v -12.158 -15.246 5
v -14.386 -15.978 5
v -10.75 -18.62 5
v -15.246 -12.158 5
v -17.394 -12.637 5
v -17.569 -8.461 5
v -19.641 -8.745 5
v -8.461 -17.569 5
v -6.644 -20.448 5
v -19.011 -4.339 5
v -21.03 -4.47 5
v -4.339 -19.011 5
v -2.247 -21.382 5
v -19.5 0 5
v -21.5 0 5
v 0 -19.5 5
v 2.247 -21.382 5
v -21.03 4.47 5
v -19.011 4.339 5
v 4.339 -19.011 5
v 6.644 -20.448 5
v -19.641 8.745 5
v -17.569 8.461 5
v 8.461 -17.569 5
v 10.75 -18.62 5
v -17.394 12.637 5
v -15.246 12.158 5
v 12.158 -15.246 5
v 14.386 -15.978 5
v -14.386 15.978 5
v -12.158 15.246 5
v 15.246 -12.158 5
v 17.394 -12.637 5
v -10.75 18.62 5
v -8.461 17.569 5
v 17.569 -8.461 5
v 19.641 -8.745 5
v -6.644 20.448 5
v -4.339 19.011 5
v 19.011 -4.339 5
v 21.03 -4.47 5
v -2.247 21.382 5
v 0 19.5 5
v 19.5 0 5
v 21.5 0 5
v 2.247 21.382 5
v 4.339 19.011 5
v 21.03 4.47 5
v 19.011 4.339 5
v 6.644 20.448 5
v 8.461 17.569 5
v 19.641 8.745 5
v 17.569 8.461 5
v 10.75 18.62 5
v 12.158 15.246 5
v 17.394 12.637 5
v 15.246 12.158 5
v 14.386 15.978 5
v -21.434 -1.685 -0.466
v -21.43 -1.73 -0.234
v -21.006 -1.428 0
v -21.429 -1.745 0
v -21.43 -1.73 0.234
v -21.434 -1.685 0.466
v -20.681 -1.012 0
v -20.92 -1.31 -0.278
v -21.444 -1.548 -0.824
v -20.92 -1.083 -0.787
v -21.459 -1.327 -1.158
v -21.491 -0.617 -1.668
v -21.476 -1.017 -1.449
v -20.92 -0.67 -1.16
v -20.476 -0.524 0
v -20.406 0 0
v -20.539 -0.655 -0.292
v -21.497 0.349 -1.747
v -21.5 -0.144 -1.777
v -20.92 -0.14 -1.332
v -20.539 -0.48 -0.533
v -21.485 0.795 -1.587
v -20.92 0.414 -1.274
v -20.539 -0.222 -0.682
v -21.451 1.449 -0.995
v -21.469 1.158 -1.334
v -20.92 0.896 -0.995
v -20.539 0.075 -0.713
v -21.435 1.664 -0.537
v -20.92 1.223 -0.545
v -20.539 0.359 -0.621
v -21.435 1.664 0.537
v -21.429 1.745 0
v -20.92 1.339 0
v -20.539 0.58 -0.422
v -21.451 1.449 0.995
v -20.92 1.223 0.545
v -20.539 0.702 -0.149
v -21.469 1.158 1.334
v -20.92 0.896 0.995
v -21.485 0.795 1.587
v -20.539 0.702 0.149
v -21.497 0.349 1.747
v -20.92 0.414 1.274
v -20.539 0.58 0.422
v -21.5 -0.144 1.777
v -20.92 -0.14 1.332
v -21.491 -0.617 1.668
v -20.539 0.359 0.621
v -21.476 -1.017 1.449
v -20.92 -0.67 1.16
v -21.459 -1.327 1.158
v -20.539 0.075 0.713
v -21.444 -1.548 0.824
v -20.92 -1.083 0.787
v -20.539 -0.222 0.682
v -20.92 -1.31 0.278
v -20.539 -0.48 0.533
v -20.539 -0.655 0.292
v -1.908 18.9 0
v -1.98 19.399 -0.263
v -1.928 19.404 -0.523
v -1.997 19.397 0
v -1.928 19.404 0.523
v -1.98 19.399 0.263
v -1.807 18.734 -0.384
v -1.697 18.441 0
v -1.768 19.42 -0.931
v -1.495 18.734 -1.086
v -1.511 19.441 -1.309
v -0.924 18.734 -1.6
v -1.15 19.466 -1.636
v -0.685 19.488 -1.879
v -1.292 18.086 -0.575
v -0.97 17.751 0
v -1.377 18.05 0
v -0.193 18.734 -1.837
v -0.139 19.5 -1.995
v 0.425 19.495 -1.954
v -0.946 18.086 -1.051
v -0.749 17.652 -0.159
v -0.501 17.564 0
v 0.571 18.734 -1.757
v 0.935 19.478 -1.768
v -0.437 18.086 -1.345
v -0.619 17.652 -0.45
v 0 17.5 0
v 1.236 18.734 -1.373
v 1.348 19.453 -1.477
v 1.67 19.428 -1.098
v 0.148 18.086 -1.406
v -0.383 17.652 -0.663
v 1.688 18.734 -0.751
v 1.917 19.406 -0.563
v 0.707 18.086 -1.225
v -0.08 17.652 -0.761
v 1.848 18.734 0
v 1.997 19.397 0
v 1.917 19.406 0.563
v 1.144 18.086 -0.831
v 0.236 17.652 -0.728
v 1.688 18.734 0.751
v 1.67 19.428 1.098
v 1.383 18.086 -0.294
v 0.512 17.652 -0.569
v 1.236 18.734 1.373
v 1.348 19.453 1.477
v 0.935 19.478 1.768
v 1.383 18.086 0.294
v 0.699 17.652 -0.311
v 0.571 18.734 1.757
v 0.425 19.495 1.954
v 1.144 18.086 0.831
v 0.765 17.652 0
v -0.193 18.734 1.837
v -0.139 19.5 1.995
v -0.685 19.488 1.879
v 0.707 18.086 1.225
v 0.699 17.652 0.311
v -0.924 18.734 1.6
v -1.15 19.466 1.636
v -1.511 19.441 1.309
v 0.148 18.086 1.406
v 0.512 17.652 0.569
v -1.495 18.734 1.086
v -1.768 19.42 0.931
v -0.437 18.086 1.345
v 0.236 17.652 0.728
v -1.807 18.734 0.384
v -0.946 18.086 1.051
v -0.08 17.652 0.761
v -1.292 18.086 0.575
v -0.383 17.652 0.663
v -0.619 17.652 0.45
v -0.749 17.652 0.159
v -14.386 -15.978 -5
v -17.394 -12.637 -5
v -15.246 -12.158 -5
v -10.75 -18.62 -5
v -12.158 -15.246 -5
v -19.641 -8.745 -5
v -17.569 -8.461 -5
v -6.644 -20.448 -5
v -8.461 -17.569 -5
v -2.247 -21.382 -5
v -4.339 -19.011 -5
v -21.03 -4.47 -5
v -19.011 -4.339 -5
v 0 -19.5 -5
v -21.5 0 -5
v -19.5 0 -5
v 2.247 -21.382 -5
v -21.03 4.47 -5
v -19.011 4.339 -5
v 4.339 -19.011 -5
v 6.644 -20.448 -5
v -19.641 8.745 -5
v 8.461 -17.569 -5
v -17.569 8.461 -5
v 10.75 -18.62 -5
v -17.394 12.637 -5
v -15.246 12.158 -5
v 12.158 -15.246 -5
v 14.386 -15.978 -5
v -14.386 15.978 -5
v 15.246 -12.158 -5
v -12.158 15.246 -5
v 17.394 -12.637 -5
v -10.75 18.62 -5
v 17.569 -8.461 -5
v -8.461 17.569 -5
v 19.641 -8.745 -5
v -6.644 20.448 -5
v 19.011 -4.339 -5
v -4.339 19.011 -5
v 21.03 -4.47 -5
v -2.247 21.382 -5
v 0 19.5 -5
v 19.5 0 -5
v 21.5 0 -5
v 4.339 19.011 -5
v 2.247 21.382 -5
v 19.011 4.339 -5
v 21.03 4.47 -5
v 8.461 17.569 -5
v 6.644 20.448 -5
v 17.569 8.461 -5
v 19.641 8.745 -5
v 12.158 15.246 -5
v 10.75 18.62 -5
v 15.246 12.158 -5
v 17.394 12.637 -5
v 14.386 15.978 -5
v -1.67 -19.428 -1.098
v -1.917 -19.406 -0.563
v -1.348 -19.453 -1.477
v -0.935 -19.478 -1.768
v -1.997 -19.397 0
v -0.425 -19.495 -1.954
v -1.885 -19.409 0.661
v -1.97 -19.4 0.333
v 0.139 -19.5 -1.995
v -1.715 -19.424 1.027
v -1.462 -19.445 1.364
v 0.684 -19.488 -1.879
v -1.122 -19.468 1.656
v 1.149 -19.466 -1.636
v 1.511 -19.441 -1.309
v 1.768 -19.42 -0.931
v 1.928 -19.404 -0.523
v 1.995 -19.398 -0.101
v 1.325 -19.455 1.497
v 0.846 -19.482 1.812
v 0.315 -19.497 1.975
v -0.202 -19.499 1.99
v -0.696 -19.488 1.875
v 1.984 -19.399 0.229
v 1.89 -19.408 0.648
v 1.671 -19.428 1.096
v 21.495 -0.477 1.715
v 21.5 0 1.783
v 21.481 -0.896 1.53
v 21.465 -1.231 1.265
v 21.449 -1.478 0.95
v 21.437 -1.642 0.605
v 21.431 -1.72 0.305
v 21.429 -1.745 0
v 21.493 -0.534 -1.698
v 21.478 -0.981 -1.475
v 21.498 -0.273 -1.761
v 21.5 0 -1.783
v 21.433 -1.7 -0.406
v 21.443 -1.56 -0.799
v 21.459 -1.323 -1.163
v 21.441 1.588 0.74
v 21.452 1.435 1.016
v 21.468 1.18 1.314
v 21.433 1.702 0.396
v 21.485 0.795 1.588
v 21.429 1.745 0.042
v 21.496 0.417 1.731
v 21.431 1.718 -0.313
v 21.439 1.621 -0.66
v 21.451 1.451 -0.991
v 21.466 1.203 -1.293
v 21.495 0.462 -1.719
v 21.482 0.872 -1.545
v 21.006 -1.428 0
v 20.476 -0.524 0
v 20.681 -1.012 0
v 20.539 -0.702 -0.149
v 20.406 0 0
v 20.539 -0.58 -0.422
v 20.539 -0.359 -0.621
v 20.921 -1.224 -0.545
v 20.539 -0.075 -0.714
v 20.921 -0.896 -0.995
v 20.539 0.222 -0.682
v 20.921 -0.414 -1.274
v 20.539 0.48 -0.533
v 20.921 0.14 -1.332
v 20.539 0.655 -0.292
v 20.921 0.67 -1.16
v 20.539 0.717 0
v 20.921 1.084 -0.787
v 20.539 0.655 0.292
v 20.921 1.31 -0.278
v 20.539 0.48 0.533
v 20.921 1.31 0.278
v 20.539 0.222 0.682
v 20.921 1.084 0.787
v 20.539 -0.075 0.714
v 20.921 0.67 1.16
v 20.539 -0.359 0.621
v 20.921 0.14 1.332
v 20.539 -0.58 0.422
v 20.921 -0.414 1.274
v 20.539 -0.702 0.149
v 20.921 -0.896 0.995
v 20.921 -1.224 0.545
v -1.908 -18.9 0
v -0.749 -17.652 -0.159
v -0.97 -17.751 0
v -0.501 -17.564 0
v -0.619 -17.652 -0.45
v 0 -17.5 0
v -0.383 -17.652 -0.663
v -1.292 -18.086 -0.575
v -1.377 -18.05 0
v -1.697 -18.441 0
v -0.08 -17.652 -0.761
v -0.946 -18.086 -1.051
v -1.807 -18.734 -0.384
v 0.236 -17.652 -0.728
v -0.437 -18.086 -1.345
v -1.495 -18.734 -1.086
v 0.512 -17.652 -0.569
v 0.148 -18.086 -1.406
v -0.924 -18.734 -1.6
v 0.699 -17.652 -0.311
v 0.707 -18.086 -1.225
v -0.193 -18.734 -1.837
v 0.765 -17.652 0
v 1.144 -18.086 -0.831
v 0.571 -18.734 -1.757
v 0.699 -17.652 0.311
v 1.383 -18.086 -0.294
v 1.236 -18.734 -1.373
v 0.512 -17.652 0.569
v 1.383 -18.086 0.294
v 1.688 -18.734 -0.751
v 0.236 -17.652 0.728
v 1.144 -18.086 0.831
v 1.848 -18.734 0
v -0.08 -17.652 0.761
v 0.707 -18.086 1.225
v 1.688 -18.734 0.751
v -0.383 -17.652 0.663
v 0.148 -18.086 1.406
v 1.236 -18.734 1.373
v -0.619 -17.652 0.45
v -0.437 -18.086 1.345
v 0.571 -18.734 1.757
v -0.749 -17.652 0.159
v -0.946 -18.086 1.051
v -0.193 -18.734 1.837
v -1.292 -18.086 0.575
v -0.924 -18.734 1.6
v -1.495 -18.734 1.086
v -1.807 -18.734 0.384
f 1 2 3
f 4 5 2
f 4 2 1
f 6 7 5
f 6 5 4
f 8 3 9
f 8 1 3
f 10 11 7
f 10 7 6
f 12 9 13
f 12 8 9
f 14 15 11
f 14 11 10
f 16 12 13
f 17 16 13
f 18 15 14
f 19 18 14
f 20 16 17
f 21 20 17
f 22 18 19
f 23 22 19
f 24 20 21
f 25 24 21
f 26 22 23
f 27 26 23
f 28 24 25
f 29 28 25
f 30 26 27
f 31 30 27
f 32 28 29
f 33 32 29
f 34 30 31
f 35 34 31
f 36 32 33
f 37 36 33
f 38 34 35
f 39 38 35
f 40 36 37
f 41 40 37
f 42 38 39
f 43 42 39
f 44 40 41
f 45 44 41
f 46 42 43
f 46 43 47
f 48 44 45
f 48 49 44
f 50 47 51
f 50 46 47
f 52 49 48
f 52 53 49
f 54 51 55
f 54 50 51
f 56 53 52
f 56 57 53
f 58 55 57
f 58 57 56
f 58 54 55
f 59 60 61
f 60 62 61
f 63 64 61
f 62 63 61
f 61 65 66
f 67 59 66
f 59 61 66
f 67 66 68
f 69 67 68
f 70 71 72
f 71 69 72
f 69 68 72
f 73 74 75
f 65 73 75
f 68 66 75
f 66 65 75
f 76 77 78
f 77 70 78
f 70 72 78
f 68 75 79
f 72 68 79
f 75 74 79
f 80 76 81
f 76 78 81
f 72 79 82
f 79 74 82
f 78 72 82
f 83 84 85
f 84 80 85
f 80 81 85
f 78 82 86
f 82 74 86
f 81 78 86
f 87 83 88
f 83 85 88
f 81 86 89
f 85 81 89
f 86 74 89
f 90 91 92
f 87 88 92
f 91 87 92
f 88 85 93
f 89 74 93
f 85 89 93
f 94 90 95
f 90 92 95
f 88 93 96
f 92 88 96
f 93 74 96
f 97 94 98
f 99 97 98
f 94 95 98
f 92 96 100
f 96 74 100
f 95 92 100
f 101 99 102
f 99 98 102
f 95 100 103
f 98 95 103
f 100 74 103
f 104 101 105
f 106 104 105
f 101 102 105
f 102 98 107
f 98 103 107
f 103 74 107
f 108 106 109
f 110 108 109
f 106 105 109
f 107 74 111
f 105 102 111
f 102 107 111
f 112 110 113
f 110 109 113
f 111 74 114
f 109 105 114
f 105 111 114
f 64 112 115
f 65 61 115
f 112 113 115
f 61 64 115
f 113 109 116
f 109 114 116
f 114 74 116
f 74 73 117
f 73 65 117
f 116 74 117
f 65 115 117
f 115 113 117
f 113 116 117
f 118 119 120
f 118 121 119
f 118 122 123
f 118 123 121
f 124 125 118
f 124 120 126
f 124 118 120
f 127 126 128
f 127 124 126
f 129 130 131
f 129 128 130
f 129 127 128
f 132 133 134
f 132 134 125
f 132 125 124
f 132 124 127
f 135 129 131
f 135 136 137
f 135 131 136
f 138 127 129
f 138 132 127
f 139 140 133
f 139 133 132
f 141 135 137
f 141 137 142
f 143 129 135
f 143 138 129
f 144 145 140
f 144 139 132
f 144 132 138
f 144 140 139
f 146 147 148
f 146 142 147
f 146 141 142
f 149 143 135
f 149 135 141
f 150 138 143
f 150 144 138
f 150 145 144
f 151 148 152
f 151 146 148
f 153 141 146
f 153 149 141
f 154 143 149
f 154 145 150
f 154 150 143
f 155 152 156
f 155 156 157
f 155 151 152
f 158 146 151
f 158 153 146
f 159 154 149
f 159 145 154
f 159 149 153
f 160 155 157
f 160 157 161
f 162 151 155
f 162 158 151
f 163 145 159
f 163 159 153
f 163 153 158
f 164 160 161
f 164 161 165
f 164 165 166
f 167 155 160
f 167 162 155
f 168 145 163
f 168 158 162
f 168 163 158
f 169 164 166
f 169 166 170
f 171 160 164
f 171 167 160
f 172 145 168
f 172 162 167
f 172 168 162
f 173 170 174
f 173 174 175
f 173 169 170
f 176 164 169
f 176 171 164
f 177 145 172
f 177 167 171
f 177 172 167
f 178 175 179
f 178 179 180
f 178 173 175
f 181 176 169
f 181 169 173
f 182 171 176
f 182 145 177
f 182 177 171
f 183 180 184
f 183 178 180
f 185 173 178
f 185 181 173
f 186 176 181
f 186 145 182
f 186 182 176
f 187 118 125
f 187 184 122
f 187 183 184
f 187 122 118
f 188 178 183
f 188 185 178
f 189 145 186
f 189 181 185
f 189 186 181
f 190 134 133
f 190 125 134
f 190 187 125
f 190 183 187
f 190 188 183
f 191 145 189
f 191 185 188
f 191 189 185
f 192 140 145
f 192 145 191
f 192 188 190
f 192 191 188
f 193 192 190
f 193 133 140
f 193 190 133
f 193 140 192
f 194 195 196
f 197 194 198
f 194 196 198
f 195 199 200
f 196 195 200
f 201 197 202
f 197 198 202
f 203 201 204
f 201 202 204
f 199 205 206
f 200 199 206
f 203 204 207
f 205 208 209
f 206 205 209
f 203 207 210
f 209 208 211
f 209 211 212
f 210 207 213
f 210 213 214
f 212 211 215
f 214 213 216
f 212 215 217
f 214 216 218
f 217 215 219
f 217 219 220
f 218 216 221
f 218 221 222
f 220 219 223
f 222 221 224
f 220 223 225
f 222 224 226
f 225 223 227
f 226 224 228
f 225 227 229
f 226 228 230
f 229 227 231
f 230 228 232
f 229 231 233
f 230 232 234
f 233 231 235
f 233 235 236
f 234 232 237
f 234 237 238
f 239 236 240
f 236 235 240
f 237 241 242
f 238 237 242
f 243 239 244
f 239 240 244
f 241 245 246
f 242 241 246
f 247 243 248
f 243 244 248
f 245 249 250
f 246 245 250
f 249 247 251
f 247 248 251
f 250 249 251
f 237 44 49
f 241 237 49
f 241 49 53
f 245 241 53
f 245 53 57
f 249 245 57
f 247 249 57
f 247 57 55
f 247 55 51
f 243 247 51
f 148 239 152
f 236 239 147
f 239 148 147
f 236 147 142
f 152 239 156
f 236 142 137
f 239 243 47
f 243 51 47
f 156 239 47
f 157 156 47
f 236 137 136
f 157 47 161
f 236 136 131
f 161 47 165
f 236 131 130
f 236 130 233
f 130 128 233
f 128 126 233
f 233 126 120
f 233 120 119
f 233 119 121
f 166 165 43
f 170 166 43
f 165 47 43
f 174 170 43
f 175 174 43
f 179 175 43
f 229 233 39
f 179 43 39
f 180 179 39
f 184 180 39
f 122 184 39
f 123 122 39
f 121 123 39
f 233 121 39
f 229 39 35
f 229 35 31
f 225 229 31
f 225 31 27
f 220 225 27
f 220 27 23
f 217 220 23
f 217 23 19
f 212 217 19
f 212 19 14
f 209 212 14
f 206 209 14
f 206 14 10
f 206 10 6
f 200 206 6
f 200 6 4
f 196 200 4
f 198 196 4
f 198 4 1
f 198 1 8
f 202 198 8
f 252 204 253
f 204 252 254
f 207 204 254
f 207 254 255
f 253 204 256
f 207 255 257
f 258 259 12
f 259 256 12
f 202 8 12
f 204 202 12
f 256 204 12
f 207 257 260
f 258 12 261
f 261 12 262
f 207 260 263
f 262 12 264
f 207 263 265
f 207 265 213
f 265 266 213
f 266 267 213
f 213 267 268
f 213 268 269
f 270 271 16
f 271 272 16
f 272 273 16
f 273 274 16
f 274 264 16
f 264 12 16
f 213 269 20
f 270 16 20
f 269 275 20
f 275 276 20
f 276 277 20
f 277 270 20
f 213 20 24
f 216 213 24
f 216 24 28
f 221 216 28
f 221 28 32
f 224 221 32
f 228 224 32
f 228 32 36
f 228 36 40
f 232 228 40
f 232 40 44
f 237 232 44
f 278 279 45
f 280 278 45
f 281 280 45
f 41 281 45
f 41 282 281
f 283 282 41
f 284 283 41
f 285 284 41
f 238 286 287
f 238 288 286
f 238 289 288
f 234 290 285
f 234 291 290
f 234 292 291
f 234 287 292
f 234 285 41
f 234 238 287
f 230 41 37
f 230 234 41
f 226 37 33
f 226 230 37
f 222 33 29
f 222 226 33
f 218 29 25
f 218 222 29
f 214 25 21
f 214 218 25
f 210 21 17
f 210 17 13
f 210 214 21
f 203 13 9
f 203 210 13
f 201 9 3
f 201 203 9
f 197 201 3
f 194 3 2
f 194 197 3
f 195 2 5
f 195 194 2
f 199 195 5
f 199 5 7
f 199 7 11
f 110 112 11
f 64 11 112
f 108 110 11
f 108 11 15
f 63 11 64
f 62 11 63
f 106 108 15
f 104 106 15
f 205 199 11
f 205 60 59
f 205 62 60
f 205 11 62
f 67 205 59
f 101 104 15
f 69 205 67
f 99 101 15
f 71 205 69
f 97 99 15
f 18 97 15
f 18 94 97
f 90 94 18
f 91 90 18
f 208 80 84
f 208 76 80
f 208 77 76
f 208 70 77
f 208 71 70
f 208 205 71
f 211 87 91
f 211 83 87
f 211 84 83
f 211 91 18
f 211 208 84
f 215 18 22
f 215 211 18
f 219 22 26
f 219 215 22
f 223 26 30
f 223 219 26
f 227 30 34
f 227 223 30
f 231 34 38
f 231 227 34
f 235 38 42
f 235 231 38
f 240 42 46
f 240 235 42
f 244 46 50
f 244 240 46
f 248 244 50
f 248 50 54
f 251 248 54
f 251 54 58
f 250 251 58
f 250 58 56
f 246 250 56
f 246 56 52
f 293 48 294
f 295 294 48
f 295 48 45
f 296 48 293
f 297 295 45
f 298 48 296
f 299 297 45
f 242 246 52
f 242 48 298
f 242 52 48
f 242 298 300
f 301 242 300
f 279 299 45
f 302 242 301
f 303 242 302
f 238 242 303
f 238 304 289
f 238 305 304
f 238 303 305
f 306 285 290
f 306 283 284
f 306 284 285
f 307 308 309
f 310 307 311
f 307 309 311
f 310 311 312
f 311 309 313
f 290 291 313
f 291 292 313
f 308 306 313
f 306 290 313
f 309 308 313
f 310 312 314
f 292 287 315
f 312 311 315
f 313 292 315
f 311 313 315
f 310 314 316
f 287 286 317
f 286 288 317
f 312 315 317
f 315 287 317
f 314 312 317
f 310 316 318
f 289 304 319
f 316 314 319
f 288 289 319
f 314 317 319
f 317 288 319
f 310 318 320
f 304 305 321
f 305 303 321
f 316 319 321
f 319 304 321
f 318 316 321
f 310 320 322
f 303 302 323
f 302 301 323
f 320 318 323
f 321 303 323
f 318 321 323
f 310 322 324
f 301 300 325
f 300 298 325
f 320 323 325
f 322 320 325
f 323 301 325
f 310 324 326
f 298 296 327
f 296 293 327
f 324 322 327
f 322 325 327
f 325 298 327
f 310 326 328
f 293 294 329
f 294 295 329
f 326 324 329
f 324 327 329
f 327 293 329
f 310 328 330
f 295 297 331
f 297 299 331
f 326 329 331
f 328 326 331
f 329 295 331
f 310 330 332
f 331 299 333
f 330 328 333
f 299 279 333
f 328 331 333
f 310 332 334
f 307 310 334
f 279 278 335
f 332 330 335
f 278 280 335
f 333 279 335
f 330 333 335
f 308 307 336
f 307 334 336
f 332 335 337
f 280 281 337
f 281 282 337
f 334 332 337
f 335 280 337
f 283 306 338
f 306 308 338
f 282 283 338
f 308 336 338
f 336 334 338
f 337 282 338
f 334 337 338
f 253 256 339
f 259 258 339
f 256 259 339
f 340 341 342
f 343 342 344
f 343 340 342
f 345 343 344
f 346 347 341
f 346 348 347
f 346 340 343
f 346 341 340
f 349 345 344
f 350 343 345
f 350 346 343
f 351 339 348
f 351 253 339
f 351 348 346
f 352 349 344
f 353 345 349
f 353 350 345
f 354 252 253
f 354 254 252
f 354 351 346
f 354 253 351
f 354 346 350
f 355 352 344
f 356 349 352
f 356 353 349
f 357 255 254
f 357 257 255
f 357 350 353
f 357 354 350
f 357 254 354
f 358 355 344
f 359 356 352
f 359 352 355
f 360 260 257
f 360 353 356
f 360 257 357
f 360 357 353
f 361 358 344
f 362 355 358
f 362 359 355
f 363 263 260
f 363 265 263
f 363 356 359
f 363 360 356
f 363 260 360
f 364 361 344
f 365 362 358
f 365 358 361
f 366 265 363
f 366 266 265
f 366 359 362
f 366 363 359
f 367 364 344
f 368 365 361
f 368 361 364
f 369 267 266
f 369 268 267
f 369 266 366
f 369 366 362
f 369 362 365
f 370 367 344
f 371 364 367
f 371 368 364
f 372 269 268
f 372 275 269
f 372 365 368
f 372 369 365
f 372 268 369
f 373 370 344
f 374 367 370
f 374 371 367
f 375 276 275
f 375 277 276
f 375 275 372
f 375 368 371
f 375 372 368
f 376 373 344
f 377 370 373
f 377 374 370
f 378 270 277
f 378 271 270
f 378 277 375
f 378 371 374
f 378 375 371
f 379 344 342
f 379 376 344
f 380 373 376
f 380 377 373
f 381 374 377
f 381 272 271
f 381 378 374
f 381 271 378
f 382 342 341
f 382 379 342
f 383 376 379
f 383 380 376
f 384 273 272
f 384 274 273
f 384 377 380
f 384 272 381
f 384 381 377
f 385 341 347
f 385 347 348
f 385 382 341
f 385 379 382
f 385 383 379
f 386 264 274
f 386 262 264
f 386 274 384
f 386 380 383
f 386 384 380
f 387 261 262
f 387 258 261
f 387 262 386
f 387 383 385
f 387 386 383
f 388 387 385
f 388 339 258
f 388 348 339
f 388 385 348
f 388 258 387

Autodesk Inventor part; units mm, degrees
ref_plane "YZ Plane" through (0, 0, 0) normal (1, 0, 0) x (0, 1, 0)
ref_plane "XZ Plane" through (0, 0, 0) normal (0, 1, 0) x (-1, 0, 0)
ref_plane "XY Plane" through (0, 0, 0) normal (0, 0, 1) x (1, 0, 0)
sketch "Sketch1" plane through (0, 0, 0) normal (0, 0, 1) x (1, 0, 0)
  circle A0 centre (0, 0) radius 25 construction
  circle A1 centre (0, 0) radius 21.5
  circle A2 centre (0, 0) radius 19.5
  circle A3 centre (0, 0) radius 19 construction
  circle A4 centre (0, 0) radius 17 construction
  line L0 (25, 0) -> (-25, 0) construction
  line L1 (0, 25) -> (0, -25) construction
  circle A5 centre (-23, 0) radius 2 construction
  circle A6 centre (23, 0) radius 2 construction
  circle A7 centre (0, 19.5) radius 2
  circle A8 centre (0, -19.5) radius 2
  line L2 (-25, 0) -> (-21, 0)
  line L3 (21, 0) -> (25, 0)
  line L4 (0, 21.5) -> (0, 17.5)
  line L5 (0, -17.5) -> (0, -21.5)
  circle A9 centre (22.4059, 0) radius 2
  circle A10 centre (-22.4059, 0) radius 2
  line L6 (-24.4059, 0) -> (-20.4059, 0)
  line L7 (24.4059, 0) -> (20.4059, 0)
  dimension "d6" = 4
  dimension "d0" = 50
  dimension "d2" = 43
  dimension "d3" = 2
  dimension "d4" = 38
  dimension "d5" = 2
  dimension "d7" = 4
  dimension "d8" = 4
  dimension "d9" = 4
  dimension "d22" = 4
extrude "Extrusion1" add sketch "Sketch1" along normal mid plane 10 contours L3 L7 A9 A1 | A1 A9 L7 L3 | A9 A1 A8 A2 A7 | A7 A2 A8 A1 A10 | L4 A2 A7 | A7 A2 L4 | L5 A2 A8 | A8 A2 L5 | A10 L6 L2 A1 | A1 L2 L6 A10 picked at (-0.5203, 20.0925) picked at (0.5115, 20.0968) picked at (0.5115, -20.0968) picked at (-0.5203, -20.0925)
revolve "Revolution1" cut sketch "Sketch1" angle 360 about axis through (-25, 0, 0) along (1, 0, 0) picked at (-22.396, -0.4915) picked at (-21.0251, -0.4685) contours A10 L2 A1 | A1 L2 L6 A10
revolve "Revolution2" cut sketch "Sketch1" angle 360 about axis through (21, 0, 0) along (1, 0, 0) picked at (22.396, -0.4915) picked at (21.0251, -0.4685) contours L3 A9 A1 | A1 A9 L7 L3
revolve "Revolution3" add sketch "Sketch1" angle 360 about axis through (0, 25, 0) along (0, -1, 0) picked at (-0.5203, 20.0925) picked at (-0.3659, 18.8452) contours L4 A2 A7 | A2 L4 A7
revolve "Revolution4" add sketch "Sketch1" angle 360 about axis through (0, 25, 0) along (0, -1, 0) picked at (-0.5203, -20.0925) picked at (-0.3659, -18.8452) contours A8 A2 L5 | A8 L5 A2
properties part number "gimbal_medium_ring"
